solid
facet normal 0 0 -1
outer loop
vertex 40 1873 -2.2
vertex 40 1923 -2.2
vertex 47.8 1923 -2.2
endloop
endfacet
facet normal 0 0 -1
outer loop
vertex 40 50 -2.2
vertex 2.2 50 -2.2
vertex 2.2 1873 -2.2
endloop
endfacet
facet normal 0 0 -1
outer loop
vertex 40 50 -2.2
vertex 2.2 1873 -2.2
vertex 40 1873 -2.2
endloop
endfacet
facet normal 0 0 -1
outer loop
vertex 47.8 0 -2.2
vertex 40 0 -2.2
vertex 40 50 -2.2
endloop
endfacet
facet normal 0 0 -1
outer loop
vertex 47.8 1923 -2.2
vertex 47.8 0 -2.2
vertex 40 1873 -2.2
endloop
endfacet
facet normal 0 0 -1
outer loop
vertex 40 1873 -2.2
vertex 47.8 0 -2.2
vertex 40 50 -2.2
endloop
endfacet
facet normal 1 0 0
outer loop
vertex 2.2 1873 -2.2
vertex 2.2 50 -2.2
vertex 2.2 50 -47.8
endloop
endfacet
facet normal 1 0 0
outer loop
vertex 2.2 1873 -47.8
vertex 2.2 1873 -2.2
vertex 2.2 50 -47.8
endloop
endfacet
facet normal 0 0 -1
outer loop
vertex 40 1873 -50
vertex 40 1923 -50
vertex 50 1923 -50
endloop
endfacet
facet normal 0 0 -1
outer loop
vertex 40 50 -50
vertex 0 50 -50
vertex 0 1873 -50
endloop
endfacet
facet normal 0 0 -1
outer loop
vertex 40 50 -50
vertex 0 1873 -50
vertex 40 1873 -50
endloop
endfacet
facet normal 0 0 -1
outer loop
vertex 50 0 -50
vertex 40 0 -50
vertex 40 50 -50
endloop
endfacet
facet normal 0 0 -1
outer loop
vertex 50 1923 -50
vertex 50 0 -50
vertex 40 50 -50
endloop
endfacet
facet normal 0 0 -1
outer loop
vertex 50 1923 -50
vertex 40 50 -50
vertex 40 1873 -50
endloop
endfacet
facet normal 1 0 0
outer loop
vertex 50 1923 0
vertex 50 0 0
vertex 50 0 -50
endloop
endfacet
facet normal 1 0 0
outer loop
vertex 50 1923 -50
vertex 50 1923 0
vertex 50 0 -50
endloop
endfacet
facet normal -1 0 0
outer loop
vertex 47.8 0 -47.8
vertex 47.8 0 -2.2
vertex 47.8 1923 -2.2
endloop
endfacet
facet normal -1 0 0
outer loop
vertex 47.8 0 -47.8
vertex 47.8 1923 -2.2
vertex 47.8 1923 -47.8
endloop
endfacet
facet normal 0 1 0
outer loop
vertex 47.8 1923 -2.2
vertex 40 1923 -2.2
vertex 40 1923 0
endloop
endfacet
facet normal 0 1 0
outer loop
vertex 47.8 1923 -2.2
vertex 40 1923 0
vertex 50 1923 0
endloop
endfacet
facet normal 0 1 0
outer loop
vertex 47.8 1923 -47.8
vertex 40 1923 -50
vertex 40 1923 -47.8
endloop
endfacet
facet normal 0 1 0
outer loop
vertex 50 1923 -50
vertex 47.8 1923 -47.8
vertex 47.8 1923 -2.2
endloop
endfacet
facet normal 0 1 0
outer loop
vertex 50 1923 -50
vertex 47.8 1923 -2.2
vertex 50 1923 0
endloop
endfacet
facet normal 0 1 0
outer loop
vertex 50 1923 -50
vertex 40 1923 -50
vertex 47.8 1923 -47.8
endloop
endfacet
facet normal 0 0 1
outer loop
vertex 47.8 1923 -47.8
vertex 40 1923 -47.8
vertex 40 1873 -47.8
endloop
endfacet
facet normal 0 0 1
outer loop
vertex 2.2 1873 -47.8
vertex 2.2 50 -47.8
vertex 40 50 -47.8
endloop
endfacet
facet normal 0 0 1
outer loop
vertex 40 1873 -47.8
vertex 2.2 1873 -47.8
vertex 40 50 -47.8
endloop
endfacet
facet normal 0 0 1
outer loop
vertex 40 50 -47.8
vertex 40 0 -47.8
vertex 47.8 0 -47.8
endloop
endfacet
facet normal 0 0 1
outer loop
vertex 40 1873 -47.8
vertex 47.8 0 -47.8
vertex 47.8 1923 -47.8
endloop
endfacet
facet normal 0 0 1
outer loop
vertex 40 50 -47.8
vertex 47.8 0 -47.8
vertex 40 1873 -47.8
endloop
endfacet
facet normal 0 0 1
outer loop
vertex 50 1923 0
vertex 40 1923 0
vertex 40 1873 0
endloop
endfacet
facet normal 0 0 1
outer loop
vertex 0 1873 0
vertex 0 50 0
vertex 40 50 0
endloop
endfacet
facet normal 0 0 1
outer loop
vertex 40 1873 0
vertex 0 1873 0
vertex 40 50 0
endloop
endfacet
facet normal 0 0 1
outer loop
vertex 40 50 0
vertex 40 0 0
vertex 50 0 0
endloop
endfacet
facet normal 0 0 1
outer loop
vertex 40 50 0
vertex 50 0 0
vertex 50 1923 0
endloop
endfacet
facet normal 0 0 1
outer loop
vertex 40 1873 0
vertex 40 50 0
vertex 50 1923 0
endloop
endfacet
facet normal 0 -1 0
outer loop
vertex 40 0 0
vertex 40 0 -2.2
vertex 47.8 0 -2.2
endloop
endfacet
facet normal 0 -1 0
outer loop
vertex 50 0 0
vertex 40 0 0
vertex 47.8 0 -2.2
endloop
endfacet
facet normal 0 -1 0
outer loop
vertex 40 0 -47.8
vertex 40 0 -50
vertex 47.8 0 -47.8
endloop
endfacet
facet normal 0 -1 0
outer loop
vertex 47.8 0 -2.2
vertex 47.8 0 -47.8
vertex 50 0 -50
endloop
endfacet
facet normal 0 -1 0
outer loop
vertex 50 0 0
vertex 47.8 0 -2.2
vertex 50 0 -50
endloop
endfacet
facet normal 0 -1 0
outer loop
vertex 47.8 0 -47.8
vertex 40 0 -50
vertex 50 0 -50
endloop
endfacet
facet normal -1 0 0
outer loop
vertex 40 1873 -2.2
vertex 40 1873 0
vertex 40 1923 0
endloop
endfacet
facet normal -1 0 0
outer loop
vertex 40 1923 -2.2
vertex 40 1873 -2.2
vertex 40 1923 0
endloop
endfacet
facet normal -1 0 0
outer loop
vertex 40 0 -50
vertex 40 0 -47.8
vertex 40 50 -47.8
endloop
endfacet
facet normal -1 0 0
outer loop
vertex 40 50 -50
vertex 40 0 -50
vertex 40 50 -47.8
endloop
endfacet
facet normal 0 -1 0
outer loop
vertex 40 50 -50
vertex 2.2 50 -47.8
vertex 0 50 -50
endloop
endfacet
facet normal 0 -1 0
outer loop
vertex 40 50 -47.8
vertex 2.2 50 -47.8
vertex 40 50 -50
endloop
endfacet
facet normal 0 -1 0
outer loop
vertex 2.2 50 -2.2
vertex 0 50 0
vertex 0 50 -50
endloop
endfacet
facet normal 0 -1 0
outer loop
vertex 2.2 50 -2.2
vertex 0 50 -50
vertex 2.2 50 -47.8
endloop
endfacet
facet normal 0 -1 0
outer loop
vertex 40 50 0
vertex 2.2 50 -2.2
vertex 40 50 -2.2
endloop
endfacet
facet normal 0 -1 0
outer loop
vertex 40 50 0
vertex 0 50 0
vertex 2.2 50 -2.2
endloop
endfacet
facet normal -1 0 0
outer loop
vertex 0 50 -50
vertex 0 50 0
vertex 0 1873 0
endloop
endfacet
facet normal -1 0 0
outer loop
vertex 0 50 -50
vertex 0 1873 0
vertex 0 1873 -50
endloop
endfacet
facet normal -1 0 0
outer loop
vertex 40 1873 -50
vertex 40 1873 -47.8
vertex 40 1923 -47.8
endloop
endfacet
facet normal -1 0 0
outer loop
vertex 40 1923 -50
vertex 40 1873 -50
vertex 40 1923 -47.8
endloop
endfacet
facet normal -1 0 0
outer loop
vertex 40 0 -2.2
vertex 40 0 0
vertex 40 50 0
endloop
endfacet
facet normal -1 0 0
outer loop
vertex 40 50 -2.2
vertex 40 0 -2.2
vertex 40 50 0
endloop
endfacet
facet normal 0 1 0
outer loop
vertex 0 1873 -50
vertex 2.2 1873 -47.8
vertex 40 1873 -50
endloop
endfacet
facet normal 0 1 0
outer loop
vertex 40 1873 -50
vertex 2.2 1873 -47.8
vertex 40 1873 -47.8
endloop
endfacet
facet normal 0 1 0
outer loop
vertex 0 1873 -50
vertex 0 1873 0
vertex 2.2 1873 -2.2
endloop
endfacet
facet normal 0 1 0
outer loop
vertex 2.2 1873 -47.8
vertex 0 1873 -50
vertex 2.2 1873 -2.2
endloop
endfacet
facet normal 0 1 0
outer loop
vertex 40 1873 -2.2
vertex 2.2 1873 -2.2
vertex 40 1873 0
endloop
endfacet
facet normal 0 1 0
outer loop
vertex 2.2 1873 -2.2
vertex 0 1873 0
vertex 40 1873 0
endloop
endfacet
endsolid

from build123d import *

# Parameters (mm, degrees)
SKETCH1_W           = 50
SKETCH1_H           = 50
SKETCH1_W_2         = 45.6
SKETCH1_H_2         = 45.6
BOSS_EXTRUDE1_DEPTH = 1923
SKETCH2_W           = 40
SKETCH2_H           = 50
CUT_EXTRUDE2_DEPTH  = 50


with BuildPart() as part:
    # Sketch1 → Boss-Extrude1 (new body)
    with BuildSketch(Plane(origin=(0, 0, 0), x_dir=(1, 0, 0), z_dir=(0, 1, 0))):
        with Locations((25, 25)):
            Rectangle(SKETCH1_W, SKETCH1_H)
        with Locations((25, 25)):
            Rectangle(SKETCH1_W_2, SKETCH1_H_2, mode=Mode.SUBTRACT)
    extrude(amount=BOSS_EXTRUDE1_DEPTH)

    # Sketch2 → Cut-Extrude2 (cut)
    with BuildSketch(Plane.XY):
        with Locations((20, 25)):
            Rectangle(SKETCH2_W, SKETCH2_H)
        with Locations((20, 1898)):
            Rectangle(SKETCH2_W, SKETCH2_H)
    extrude(amount=-CUT_EXTRUDE2_DEPTH, mode=Mode.SUBTRACT)


solid = part.part
